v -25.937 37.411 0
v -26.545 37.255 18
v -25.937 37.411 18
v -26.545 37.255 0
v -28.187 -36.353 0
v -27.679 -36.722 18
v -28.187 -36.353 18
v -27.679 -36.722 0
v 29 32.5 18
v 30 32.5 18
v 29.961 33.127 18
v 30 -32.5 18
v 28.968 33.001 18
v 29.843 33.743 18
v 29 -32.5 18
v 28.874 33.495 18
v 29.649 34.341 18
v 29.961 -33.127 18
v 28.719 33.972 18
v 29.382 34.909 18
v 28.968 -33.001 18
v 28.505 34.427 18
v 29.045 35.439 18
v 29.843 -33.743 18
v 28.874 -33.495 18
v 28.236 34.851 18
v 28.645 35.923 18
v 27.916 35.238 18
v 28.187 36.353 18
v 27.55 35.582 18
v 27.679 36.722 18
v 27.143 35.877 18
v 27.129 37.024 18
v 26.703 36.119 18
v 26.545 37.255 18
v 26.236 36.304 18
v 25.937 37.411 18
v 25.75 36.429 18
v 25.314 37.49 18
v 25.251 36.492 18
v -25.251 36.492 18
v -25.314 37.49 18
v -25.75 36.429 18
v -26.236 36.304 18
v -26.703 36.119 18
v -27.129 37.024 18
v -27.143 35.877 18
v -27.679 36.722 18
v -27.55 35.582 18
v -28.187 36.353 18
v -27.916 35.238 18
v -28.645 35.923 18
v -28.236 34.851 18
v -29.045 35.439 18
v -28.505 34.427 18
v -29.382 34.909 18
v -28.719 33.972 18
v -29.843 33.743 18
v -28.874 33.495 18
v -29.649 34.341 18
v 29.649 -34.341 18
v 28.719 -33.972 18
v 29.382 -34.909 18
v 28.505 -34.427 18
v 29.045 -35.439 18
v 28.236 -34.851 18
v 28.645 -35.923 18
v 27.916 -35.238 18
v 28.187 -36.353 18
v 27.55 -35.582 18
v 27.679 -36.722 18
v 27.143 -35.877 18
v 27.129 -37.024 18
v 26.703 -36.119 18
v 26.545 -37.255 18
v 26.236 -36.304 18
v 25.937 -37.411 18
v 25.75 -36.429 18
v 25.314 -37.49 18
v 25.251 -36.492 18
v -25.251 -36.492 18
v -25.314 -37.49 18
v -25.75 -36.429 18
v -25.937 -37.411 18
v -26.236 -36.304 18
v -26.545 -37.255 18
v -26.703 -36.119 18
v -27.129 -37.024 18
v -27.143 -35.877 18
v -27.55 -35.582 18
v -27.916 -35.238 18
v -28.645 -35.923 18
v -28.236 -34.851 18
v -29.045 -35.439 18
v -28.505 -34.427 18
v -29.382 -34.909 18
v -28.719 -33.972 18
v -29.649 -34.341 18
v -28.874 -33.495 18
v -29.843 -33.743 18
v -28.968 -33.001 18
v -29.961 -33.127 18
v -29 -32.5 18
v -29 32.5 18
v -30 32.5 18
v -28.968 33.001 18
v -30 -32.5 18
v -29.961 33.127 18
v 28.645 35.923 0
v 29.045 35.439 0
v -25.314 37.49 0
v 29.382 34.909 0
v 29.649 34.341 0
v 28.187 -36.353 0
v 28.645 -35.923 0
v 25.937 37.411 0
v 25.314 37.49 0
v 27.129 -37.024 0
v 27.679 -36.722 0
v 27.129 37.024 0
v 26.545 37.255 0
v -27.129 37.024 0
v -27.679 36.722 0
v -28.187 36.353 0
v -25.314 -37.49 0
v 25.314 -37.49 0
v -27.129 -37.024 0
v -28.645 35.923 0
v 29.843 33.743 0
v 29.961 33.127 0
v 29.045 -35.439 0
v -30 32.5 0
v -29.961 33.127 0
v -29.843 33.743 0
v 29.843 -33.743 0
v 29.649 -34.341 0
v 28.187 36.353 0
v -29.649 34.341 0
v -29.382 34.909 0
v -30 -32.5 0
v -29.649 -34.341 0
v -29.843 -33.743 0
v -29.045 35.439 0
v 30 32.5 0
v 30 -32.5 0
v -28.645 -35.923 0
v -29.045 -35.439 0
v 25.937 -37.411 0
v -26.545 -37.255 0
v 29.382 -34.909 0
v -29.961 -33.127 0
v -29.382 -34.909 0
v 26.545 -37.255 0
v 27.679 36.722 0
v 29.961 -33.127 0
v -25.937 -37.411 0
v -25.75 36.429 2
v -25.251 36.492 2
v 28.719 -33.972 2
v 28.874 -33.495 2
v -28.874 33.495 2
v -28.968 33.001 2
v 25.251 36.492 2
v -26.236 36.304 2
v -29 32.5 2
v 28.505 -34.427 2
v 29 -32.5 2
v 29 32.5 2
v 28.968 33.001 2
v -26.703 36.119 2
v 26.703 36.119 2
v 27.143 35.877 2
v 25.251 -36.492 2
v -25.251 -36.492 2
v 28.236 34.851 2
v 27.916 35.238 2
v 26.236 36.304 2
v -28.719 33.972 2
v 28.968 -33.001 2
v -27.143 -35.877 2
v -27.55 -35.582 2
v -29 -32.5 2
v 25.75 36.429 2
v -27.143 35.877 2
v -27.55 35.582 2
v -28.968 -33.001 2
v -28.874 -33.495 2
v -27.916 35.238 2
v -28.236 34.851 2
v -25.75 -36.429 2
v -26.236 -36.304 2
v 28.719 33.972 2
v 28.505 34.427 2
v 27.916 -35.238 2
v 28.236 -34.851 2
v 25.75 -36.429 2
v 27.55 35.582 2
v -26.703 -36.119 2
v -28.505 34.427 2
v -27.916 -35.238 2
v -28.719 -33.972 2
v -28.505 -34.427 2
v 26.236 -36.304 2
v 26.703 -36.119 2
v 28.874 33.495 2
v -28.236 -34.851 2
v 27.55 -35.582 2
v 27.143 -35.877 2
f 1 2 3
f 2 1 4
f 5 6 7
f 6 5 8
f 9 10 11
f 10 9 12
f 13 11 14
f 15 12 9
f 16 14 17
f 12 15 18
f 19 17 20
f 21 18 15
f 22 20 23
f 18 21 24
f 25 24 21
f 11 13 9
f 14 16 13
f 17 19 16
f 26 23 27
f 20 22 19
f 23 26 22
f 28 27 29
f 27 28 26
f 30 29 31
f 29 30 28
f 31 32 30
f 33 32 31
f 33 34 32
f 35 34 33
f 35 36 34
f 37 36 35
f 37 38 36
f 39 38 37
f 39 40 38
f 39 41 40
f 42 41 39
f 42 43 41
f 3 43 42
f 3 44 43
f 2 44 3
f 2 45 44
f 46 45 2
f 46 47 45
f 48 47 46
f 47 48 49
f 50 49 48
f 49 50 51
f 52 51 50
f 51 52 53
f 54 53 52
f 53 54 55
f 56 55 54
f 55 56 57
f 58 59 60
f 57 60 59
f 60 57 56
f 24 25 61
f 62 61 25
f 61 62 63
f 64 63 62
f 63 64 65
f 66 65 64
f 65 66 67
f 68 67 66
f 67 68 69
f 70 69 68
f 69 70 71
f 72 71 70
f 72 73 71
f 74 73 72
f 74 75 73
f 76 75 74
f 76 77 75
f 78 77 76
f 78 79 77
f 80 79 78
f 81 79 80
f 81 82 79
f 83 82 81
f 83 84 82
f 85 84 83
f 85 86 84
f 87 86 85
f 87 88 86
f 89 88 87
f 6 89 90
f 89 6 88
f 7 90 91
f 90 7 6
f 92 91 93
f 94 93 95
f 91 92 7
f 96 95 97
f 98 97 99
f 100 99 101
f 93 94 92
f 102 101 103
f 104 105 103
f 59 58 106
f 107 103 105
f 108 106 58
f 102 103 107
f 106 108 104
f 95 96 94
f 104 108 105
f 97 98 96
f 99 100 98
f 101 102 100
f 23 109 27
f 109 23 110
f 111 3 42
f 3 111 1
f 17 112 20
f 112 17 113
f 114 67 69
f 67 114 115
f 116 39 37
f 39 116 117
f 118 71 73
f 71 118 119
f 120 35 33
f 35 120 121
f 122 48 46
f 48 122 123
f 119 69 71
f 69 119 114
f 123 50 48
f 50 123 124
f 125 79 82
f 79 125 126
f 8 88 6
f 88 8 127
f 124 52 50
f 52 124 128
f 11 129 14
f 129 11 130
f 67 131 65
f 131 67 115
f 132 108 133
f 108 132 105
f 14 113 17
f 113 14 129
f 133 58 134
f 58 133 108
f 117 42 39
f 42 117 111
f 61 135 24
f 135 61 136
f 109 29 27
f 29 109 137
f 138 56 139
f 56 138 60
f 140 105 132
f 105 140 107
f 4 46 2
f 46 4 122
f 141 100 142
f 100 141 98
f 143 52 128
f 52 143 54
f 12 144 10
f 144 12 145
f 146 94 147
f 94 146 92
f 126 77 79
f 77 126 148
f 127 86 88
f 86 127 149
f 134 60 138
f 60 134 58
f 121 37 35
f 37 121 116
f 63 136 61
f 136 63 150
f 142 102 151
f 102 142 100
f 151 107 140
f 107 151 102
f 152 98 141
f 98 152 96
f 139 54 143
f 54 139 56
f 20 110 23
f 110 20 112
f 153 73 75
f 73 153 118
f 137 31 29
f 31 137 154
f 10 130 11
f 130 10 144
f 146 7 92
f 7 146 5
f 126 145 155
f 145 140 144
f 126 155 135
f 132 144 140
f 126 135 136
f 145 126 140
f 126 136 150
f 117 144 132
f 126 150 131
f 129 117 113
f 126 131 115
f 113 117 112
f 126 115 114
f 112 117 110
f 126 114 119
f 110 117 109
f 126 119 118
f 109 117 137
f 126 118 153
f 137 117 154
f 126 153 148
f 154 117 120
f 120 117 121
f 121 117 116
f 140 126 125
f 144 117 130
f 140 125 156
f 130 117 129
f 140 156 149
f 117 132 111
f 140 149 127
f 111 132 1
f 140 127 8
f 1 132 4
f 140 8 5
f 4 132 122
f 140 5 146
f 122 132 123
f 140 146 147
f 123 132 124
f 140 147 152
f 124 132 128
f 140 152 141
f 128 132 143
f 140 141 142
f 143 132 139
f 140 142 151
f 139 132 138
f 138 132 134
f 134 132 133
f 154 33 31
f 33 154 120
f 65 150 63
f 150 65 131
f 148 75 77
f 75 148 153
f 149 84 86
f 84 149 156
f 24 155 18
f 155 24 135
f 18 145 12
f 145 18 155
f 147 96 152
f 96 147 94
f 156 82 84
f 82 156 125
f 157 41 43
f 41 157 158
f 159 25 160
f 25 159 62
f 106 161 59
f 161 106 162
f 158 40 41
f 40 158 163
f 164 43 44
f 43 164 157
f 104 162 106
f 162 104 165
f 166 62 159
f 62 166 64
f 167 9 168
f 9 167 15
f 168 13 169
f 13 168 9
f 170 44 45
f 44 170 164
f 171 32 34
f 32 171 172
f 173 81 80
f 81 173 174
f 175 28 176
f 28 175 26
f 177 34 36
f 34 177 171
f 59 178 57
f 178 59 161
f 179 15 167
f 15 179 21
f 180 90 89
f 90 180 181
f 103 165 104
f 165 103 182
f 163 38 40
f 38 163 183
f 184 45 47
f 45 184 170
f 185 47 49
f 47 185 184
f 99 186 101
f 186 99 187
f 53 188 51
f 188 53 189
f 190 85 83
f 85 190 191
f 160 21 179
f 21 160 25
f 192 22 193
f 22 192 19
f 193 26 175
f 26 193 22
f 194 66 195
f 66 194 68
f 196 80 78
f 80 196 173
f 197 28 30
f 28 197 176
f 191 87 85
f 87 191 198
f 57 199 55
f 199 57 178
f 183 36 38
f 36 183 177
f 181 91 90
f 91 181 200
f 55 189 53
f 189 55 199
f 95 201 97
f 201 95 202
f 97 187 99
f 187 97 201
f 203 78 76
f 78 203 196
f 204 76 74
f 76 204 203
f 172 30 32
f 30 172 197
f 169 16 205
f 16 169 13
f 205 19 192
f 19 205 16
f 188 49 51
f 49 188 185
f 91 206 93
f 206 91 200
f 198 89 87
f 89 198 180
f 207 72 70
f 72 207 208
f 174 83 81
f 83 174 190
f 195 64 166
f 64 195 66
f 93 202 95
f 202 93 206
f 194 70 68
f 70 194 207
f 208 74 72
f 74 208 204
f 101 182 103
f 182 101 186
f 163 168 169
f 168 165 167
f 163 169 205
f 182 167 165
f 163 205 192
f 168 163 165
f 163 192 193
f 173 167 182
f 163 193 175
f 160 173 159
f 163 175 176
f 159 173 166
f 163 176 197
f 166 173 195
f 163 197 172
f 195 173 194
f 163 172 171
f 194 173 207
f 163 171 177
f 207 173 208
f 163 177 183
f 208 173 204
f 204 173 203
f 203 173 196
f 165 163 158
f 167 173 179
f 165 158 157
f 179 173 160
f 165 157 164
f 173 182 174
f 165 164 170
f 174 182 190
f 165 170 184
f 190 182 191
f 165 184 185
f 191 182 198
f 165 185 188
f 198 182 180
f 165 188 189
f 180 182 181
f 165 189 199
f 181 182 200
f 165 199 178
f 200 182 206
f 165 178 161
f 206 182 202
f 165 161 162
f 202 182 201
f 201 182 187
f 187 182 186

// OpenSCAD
$fn = 50;


difference() {
	union() {
		hull() {
			translate(v = [-25.0000000000, 32.5000000000, 0]) {
				cylinder(h = 18, r = 5);
			}
			translate(v = [25.0000000000, 32.5000000000, 0]) {
				cylinder(h = 18, r = 5);
			}
			translate(v = [-25.0000000000, -32.5000000000, 0]) {
				cylinder(h = 18, r = 5);
			}
			translate(v = [25.0000000000, -32.5000000000, 0]) {
				cylinder(h = 18, r = 5);
			}
		}
	}
	union() {
		translate(v = [0, 0, 2]) {
			hull() {
				translate(v = [-25.0000000000, 32.5000000000, 0]) {
					cylinder(h = 16, r = 4);
				}
				translate(v = [25.0000000000, 32.5000000000, 0]) {
					cylinder(h = 16, r = 4);
				}
				translate(v = [-25.0000000000, -32.5000000000, 0]) {
					cylinder(h = 16, r = 4);
				}
				translate(v = [25.0000000000, -32.5000000000, 0]) {
					cylinder(h = 16, r = 4);
				}
			}
		}
	}
}
